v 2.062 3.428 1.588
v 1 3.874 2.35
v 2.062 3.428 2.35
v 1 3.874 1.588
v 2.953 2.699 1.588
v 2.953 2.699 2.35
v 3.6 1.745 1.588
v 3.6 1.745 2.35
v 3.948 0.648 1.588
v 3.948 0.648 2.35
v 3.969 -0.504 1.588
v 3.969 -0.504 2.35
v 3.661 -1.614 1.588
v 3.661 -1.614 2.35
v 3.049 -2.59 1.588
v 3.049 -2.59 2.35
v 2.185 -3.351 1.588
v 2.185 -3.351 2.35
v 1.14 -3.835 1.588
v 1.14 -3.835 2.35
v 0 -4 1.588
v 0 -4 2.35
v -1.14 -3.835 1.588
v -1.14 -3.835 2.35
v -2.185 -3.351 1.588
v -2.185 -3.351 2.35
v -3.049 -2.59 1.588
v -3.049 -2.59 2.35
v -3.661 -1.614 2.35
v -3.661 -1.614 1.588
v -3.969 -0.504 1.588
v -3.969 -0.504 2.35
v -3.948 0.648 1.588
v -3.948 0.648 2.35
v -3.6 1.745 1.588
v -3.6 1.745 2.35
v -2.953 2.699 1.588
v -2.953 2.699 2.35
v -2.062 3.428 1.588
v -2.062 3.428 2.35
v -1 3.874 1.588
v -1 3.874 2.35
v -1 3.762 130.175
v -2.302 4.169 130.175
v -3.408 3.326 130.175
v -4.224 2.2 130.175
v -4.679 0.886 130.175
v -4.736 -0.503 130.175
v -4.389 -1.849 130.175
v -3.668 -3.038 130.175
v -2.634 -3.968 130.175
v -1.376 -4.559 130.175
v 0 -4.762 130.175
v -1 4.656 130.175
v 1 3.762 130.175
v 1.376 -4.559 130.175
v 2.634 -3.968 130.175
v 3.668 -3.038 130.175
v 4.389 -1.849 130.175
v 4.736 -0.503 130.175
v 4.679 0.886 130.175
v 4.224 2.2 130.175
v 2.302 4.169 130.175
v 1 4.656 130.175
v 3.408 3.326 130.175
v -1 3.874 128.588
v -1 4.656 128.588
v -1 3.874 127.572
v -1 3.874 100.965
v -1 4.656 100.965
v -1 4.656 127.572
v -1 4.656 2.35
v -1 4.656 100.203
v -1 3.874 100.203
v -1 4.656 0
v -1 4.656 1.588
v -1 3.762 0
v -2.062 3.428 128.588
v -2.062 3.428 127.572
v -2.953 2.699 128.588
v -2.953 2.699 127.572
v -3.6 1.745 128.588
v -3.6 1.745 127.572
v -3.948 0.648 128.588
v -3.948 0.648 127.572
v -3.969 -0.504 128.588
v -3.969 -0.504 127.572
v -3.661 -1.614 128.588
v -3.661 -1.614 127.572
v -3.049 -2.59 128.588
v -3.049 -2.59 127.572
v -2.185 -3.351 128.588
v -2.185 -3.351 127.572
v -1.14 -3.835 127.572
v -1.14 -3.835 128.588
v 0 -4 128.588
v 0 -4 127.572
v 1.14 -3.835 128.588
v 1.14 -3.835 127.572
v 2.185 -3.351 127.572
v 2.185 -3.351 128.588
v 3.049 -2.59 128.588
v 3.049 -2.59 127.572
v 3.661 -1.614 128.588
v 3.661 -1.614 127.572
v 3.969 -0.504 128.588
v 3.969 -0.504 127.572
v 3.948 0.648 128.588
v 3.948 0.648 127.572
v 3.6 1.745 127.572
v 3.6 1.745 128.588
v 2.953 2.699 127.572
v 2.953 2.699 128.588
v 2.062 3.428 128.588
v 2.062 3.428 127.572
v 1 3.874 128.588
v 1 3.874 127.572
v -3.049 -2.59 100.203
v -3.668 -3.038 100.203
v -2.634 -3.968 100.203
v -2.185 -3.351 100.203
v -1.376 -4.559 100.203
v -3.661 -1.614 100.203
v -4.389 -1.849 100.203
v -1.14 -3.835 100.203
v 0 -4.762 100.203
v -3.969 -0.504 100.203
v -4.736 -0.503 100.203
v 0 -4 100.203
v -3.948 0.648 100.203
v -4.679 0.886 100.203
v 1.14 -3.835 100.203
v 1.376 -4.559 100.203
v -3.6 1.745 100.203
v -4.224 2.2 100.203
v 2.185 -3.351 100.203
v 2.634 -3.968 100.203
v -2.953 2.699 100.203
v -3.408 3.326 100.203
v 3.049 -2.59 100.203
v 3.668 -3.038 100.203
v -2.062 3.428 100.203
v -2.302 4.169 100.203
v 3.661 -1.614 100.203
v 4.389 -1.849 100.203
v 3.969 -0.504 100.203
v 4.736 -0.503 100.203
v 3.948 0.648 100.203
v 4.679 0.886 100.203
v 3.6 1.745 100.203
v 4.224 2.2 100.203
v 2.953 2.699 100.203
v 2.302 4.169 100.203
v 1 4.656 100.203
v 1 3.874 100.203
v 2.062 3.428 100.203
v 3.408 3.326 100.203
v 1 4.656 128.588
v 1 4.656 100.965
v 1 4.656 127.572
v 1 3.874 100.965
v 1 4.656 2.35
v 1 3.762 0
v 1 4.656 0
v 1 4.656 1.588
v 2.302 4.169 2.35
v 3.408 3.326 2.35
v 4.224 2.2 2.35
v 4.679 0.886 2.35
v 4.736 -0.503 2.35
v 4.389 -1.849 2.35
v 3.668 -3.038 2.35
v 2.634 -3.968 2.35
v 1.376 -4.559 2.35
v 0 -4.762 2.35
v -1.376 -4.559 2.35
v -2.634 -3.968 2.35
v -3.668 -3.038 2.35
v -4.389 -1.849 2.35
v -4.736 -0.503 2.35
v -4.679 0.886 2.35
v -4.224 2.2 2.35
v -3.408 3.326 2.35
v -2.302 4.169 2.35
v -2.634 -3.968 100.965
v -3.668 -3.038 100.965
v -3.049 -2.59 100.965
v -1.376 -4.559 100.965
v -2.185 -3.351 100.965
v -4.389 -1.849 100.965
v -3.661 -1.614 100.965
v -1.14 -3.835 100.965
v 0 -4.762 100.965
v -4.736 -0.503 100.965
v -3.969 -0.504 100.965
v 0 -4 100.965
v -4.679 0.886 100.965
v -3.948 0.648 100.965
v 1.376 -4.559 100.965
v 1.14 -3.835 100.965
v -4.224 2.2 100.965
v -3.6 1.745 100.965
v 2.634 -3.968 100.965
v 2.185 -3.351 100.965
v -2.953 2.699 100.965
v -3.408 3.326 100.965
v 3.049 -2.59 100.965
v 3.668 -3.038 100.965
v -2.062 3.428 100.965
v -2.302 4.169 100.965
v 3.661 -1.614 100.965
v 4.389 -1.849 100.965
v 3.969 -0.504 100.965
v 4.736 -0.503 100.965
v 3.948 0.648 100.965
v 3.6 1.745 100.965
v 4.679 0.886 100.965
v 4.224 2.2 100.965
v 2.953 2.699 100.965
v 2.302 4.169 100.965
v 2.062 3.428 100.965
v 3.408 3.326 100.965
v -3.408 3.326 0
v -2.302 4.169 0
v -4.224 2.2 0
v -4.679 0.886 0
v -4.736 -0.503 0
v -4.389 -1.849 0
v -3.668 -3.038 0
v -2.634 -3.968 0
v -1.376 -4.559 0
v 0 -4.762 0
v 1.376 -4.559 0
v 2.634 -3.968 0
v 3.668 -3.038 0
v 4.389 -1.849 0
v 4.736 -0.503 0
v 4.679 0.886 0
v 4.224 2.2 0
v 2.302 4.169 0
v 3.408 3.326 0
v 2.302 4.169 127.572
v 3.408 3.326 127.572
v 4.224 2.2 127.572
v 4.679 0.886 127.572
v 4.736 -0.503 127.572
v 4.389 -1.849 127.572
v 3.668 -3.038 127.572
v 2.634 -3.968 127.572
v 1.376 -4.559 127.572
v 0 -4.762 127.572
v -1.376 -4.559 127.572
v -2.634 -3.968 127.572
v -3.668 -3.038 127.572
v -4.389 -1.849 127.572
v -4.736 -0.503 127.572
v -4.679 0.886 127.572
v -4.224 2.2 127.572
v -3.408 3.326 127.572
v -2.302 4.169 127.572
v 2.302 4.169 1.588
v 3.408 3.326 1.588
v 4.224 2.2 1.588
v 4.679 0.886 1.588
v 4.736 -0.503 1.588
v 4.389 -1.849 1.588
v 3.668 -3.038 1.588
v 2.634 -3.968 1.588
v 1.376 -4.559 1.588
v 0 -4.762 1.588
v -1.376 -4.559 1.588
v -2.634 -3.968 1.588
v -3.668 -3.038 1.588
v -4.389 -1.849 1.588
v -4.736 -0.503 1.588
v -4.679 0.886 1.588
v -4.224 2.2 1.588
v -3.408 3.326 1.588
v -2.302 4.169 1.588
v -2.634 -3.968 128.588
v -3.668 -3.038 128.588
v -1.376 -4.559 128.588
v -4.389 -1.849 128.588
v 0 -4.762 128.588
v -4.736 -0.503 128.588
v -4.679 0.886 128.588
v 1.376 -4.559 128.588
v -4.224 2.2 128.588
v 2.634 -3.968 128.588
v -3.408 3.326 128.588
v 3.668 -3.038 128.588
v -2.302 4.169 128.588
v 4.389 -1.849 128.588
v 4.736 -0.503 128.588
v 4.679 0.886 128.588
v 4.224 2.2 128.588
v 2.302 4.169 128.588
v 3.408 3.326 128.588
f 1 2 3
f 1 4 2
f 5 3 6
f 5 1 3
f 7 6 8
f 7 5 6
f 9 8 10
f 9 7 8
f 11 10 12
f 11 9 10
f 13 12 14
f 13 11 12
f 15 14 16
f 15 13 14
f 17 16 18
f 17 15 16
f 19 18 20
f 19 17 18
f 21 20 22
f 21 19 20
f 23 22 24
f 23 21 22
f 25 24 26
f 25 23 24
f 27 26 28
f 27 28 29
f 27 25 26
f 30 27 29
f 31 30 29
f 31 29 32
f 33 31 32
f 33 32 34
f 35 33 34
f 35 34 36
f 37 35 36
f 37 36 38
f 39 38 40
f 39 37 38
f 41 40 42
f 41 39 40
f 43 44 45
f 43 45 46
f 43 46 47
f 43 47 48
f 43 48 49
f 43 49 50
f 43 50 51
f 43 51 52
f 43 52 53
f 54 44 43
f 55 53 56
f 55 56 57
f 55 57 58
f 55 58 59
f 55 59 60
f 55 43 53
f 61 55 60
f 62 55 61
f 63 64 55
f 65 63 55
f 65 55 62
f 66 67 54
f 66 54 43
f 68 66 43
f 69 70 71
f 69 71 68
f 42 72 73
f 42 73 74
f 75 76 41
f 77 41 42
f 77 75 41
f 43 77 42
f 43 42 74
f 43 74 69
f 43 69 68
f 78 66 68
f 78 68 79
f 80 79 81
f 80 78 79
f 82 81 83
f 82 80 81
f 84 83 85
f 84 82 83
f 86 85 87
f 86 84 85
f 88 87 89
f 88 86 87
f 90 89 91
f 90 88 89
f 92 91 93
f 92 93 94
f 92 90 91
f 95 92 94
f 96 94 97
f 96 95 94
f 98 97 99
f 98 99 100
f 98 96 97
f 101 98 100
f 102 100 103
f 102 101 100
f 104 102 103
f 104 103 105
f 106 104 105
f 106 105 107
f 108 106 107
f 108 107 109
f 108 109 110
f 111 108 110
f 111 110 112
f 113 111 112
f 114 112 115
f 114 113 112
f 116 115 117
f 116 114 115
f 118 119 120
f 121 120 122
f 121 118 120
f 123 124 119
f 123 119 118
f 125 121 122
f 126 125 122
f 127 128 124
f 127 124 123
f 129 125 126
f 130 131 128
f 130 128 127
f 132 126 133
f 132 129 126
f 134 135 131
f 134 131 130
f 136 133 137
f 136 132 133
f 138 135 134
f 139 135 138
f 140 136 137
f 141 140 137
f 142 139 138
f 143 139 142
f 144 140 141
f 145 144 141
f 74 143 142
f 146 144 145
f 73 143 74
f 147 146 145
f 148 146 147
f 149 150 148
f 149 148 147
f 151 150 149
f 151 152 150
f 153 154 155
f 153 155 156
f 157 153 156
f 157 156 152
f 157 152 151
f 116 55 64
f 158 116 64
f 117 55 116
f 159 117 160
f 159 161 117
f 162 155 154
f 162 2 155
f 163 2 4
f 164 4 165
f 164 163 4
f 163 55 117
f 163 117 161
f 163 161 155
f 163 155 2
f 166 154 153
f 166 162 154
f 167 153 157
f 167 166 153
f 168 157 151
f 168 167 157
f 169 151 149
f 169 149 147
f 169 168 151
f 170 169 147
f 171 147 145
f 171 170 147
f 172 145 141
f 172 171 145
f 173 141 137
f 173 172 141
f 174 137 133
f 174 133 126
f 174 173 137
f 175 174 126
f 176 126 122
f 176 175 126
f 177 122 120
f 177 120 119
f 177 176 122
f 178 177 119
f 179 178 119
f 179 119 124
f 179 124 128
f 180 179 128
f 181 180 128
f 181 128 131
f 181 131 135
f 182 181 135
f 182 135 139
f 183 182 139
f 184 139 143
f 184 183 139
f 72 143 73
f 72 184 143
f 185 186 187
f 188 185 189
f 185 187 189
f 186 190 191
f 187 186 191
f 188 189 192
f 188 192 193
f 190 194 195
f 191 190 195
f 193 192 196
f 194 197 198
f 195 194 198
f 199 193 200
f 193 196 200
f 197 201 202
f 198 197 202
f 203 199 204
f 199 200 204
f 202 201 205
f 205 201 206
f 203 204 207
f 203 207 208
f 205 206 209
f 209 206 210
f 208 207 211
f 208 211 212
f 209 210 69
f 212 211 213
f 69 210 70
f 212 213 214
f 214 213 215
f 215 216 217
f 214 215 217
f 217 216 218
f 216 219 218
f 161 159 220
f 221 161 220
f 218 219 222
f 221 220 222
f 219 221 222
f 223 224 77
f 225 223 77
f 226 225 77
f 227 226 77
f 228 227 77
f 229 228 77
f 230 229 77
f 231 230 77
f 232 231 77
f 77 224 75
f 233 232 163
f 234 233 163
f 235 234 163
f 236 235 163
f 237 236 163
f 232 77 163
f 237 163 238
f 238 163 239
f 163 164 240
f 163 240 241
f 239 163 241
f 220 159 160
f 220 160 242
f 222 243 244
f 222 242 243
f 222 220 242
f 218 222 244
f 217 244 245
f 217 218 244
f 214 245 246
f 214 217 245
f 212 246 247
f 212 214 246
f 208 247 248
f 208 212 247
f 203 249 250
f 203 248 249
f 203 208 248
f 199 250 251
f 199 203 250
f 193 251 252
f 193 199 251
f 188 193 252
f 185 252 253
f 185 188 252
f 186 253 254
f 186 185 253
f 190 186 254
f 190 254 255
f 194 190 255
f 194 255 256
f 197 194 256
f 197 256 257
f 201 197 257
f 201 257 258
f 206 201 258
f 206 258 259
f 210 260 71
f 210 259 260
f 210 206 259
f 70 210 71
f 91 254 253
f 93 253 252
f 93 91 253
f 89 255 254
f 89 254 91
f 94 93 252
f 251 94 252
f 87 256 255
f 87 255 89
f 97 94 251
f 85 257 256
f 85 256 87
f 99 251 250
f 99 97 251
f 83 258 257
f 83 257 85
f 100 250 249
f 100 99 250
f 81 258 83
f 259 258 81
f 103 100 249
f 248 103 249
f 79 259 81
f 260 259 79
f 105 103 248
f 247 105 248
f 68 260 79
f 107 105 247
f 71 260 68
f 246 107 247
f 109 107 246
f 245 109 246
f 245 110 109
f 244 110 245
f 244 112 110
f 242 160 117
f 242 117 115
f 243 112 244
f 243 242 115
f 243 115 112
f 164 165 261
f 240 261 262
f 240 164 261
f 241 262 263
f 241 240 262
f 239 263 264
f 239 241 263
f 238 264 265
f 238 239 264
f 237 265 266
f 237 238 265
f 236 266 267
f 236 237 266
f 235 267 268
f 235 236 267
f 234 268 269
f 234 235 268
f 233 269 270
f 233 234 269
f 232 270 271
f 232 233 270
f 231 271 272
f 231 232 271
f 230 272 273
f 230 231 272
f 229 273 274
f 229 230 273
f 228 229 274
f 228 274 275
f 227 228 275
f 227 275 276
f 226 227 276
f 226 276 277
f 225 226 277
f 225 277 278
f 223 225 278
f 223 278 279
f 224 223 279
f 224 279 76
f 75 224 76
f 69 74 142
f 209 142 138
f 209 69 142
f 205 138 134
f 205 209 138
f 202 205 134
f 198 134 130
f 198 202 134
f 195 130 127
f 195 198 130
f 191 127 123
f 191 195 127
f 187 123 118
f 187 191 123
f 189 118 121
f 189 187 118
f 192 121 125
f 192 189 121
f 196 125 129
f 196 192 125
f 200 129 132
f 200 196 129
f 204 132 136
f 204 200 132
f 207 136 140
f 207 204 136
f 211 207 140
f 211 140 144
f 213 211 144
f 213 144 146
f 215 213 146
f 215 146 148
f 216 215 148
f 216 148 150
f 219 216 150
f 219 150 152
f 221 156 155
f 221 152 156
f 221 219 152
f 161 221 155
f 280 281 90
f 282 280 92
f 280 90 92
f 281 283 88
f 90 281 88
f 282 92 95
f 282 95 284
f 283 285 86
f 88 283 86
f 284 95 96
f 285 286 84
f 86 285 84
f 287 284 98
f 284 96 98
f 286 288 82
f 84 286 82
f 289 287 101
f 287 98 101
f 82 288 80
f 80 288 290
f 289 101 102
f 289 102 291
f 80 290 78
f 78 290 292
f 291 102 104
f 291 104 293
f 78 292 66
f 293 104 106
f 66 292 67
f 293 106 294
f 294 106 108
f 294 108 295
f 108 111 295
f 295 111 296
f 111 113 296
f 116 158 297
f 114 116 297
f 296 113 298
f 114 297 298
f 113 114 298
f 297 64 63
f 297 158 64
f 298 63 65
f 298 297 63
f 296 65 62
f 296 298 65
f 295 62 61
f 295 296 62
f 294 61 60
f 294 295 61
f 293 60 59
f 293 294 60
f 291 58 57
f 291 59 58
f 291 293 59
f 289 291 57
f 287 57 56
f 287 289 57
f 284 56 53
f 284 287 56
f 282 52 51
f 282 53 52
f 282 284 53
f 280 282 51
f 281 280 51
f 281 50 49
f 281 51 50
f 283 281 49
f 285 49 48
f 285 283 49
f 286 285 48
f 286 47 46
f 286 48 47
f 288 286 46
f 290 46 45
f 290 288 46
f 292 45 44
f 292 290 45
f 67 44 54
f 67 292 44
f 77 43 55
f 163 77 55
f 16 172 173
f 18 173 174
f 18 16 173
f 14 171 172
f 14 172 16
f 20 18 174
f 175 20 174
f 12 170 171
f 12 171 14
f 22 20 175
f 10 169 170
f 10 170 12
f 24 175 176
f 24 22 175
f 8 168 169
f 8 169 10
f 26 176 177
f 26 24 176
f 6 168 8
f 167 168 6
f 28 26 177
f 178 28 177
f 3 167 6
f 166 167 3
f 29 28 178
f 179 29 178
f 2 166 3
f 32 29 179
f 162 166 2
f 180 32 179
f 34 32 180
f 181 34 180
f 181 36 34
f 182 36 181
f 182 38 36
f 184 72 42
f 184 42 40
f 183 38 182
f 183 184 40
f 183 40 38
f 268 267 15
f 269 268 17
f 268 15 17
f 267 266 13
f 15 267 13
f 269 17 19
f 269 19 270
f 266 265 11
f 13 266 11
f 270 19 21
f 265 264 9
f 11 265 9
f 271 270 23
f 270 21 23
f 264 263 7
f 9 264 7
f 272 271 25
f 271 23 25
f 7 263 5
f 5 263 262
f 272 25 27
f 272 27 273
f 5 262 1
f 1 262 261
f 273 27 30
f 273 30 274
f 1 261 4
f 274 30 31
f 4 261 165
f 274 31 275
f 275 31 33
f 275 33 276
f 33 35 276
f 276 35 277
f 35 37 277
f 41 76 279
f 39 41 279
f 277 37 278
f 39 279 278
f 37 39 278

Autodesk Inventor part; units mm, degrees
sketch "Sketch1" plane through (0, 0, 0) normal (0, 0, 1) x (1, 0, 0)
  arc A0 (-1, 4.6563) -> (1, 4.6563) centre (0, 0) ccw
  line L0 (-1, 3.7625) -> (1, 3.7625)
  line L1 (1, 3.7625) -> (1, 4.6563)
  line L2 (1, 5.7625) -> (-1, 5.7625) construction
  line L3 (-1, 5.7625) -> (-1, 4.6563) construction
  arc A1 (1, 4.6563) -> (-1, 4.6563) centre (0, 0) ccw construction
  line L4 (-1, 4.6563) -> (-1, 3.7625)
  line L5 (1, 4.6563) -> (1, 5.7625) construction
  dimension "d0" = 9.525
  dimension "d3" = 2
  dimension "d4" = 2
  dimension "d5" = 1
  dimension "d6" = 3.7625
extrude "Extrusion1" add sketch "Sketch1" along normal blind 130.175
ref_plane "Work Plane1" through (0, 0, 1.5875) normal (0, 0, -1) x (-1, 0, 0)
sketch "Sketch2" plane through (0, 0, 1.5875) normal (0, 0, -1) x (-1, 0, 0)
  line L0 (-1, 3.7625) -> (-1, 4.6563) projected
  line L1 (1, 3.7625) -> (-1, 3.7625) projected
  line L2 (1, 4.6563) -> (1, 3.7625) projected
  arc A0 (-1, 4.6563) -> (1, 4.6563) centre (0, 0) ccw projected
  arc A1 (-1, 3.8735) -> (1, 3.8735) centre (0, 0) ccw
  arc A2 (1, 3.8735) -> (-1, 3.8735) centre (0, 0) ccw construction
  dimension "d9" = 0.762
extrude "Extrusion2" cut sketch "Sketch2" against normal blind 0.762 contours A1 L2 A0 L0
ref_plane "Work Plane2" through (0, 0, 100.965) normal (0, 0, 1) x (1, 0, 0)
sketch "Sketch3" plane through (0, 0, 100.965) normal (0, 0, 1) x (1, 0, 0)
  arc A0 (1, 3.8735) -> (-1, 3.8735) centre (0, 0) ccw projected
  line L0 (1, 3.7625) -> (1, 4.6563) projected
  arc A1 (1, 4.6563) -> (-1, 4.6563) centre (0, 0) ccw projected
  line L1 (-1, 4.6563) -> (-1, 3.7625) projected
  line L2 (-1, 3.7625) -> (1, 3.7625) projected
  arc A2 (-1, 3.8735) -> (1, 3.8735) centre (0, 0) ccw projected
  arc A3 (-1, 4.6563) -> (1, 4.6563) centre (0, 0) ccw projected
extrude "Extrusion3" cut sketch "Sketch3" against normal blind 0.762 contours A0 L1 A1 L0 | L0 A3 L1 A2
ref_plane "Work Plane3" through (0, 0, 128.5875) normal (0, 0, 1) x (1, 0, 0)
sketch "Sketch4" plane through (0, 0, 128.5875) normal (0, 0, 1) x (1, 0, 0)
  arc A0 (-1, 3.8735) -> (1, 3.8735) centre (0, 0) ccw projected
  line L0 (-1, 3.7625) -> (1, 3.7625) projected
  line L1 (-1, 4.6563) -> (-1, 3.7625) projected
  line L2 (1, 3.7625) -> (1, 4.6563) projected
  arc A1 (-1, 4.6563) -> (1, 4.6563) centre (0, 0) ccw projected
extrude "Extrusion4" cut sketch "Sketch4" against normal blind 1.016 contours A0 L2 A1 L1
equation "\"d4\" = d3"
equation "\"d5\" = 0.5 * d3"
equation "\"d6\" = 0.5 * d0 - 0.5 * d4"
properties part number "vertical drive shaft 4"
